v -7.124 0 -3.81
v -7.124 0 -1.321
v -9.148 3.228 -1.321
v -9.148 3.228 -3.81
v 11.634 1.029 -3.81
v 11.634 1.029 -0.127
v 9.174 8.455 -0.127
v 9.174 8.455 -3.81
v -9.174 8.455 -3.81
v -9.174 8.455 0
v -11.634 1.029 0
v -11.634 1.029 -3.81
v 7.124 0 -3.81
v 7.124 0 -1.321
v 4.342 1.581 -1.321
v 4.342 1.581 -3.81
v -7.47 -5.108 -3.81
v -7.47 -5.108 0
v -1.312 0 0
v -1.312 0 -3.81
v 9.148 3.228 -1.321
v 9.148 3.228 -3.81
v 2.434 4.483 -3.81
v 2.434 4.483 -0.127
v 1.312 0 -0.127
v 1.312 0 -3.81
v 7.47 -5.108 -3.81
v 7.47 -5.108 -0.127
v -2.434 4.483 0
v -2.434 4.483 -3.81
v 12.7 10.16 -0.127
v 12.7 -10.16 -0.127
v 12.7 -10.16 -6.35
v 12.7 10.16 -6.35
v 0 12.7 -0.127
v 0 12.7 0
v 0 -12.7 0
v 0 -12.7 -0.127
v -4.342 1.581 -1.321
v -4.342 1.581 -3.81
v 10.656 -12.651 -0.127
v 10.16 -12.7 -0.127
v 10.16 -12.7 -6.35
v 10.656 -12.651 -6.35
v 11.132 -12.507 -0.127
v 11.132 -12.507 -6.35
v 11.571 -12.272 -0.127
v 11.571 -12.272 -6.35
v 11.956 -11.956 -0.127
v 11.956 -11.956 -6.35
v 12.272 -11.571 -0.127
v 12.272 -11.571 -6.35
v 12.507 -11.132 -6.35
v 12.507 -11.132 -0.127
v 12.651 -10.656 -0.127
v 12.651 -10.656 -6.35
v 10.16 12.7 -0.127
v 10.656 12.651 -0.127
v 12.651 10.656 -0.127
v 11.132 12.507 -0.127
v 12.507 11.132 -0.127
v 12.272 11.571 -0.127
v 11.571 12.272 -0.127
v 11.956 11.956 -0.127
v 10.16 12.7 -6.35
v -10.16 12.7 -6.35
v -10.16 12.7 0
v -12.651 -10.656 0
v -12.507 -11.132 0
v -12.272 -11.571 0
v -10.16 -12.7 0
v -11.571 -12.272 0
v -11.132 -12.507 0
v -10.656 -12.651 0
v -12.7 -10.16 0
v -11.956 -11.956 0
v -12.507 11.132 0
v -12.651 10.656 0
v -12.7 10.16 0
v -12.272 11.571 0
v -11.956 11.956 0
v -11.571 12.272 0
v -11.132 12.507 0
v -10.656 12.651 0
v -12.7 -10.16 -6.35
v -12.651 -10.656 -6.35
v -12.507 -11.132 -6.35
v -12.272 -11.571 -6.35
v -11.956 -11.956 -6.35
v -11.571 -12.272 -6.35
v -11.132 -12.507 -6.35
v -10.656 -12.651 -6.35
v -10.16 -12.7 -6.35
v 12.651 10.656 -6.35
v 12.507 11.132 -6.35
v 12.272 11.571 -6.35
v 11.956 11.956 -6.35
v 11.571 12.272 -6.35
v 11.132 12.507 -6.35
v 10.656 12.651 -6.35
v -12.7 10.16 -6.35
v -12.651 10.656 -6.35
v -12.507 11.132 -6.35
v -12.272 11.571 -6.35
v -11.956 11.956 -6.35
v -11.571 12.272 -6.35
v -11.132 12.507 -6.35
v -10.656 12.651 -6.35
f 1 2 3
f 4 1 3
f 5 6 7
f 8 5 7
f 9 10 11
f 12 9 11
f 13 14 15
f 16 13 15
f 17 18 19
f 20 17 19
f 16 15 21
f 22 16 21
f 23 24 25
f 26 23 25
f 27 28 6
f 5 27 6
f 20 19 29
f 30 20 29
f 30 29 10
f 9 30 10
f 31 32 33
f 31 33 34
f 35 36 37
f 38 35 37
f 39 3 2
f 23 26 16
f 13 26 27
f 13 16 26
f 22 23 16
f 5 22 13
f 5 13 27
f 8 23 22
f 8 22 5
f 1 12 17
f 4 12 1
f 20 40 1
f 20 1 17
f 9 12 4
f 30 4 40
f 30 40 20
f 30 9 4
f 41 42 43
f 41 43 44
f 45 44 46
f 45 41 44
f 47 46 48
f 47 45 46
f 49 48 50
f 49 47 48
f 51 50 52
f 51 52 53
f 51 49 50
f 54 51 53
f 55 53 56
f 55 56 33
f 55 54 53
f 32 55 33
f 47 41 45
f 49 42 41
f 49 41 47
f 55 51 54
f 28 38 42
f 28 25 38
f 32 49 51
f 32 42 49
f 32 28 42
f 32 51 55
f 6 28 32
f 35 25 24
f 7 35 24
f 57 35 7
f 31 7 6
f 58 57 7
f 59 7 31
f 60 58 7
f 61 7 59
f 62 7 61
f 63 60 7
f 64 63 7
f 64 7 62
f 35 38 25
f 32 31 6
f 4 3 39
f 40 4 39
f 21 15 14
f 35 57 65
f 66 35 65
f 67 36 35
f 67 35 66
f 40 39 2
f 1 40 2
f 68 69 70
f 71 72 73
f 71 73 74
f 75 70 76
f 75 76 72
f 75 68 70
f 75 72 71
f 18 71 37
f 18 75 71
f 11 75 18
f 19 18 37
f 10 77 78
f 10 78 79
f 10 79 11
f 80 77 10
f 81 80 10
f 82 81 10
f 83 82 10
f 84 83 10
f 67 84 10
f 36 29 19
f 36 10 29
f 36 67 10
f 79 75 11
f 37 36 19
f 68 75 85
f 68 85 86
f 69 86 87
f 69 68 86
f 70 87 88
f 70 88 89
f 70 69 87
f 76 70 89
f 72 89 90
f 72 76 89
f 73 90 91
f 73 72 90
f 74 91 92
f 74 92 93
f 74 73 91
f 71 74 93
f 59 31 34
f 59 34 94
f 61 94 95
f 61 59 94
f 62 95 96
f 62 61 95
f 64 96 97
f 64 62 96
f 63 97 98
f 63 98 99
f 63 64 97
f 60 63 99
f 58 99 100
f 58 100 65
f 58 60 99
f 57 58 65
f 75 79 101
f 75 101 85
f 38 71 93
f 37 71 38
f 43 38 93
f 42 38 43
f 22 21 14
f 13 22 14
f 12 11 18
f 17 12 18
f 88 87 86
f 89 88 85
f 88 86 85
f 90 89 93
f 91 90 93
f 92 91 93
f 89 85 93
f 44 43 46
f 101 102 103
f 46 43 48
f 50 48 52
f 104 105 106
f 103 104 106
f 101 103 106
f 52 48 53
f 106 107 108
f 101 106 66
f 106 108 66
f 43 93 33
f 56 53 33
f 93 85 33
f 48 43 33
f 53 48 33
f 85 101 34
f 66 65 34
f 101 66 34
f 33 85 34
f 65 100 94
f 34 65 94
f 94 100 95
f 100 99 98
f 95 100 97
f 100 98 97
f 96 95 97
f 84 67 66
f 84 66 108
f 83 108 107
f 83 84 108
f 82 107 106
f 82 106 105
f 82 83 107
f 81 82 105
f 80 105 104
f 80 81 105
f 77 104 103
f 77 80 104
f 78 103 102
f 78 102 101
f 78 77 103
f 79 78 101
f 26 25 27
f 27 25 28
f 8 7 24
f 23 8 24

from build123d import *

# Parameters (mm, degrees)
F1_DEPTH = 6.35
F2_DEPTH = 3.81
F3_DEPTH = 1.3208
F4_DEPTH = 0.127


with BuildPart() as f1:
    # F0 (on Top) → F1 (new body)
    with BuildSketch(Plane.XY):
        with BuildLine():
            Line((0, 12.7), (-10.16, 12.7))
            ThreePointArc((-10.16, 12.7), (-11.9560512242, 11.9560512242), (-12.7, 10.16))
            Line((-12.7, 10.16), (-12.7, -10.16))
            ThreePointArc((-12.7, -10.16), (-11.9560512242, -11.9560512242), (-10.16, -12.7))
            Line((-10.16, -12.7), (0, -12.7))
            Line((0, -12.7), (0, 12.7))
        make_face()
        Polygon((-9.1738812898, 8.45533709), (-2.4342421361, 4.4829672283), (-1.3116230257, 0), (-7.4698259894, -5.1080854787), (-11.6343700355, 1.0291366232), align=None, mode=Mode.SUBTRACT)
        with BuildLine():
            Line((10.16, 12.7), (0, 12.7))
            Line((0, 12.7), (0, -12.7))
            Line((0, -12.7), (10.16, -12.7))
            ThreePointArc((10.16, -12.7), (11.9560512242, -11.9560512242), (12.7, -10.16))
            Line((12.7, -10.16), (12.7, 10.16))
            ThreePointArc((12.7, 10.16), (11.9560512242, 11.9560512242), (10.16, 12.7))
        make_face()
        Polygon((7.4698259894, -5.1080854787), (1.3116230257, 0), (2.4342421361, 4.4829672283), (9.1738812898, 8.45533709), (11.6343700355, 1.0291366232), align=None, mode=Mode.SUBTRACT)
        Polygon((-1.3116230257, 0), (-2.4342421361, 4.4829672283), (-9.1738812898, 8.45533709), (-11.6343700355, 1.0291366232), (-7.4698259894, -5.1080854787), align=None)
        Polygon((-4.3419757446, 1.5814950152), (-7.1237651675, 0), (-9.1477709961, 3.227925093), align=None, mode=Mode.SUBTRACT)
        Polygon((-9.1477709961, 3.227925093), (-7.1237651675, 0), (-4.3419757446, 1.5814950152), align=None)
        Polygon((2.4342421361, 4.4829672283), (1.3116230257, 0), (7.4698259894, -5.1080854787), (11.6343700355, 1.0291366232), (9.1738812898, 8.45533709), align=None)
        Polygon((4.3419757446, 1.5814950152), (9.1477709961, 3.227925093), (7.1237651675, 0), align=None, mode=Mode.SUBTRACT)
        Polygon((7.1237651675, 0), (9.1477709961, 3.227925093), (4.3419757446, 1.5814950152), align=None)
    extrude(amount=-F1_DEPTH)

    # F0 (on Top) → F2 (cut)
    with BuildSketch(Plane.XY):
        Polygon((-1.3116230257, 0), (-2.4342421361, 4.4829672283), (-9.1738812898, 8.45533709), (-11.6343700355, 1.0291366232), (-7.4698259894, -5.1080854787), align=None)
        Polygon((-4.3419757446, 1.5814950152), (-7.1237651675, 0), (-9.1477709961, 3.227925093), align=None, mode=Mode.SUBTRACT)
        Polygon((2.4342421361, 4.4829672283), (1.3116230257, 0), (7.4698259894, -5.1080854787), (11.6343700355, 1.0291366232), (9.1738812898, 8.45533709), align=None)
        Polygon((4.3419757446, 1.5814950152), (9.1477709961, 3.227925093), (7.1237651675, 0), align=None, mode=Mode.SUBTRACT)
    extrude(amount=-F2_DEPTH, mode=Mode.SUBTRACT)

    # F0 (on Top) → F3 (cut)
    with BuildSketch(Plane.XY):
        Polygon((-9.1477709961, 3.227925093), (-7.1237651675, 0), (-4.3419757446, 1.5814950152), align=None)
        Polygon((7.1237651675, 0), (9.1477709961, 3.227925093), (4.3419757446, 1.5814950152), align=None)
    extrude(amount=-F3_DEPTH, mode=Mode.SUBTRACT)

    # F0 (on Top) → F4 (cut)
    with BuildSketch(Plane.XY):
        with BuildLine():
            Line((10.16, 12.7), (0, 12.7))
            Line((0, 12.7), (0, -12.7))
            Line((0, -12.7), (10.16, -12.7))
            ThreePointArc((10.16, -12.7), (11.9560512242, -11.9560512242), (12.7, -10.16))
            Line((12.7, -10.16), (12.7, 10.16))
            ThreePointArc((12.7, 10.16), (11.9560512242, 11.9560512242), (10.16, 12.7))
        make_face()
        Polygon((7.4698259894, -5.1080854787), (1.3116230257, 0), (2.4342421361, 4.4829672283), (9.1738812898, 8.45533709), (11.6343700355, 1.0291366232), align=None, mode=Mode.SUBTRACT)
    extrude(amount=-F4_DEPTH, mode=Mode.SUBTRACT)


solid = f1.part
